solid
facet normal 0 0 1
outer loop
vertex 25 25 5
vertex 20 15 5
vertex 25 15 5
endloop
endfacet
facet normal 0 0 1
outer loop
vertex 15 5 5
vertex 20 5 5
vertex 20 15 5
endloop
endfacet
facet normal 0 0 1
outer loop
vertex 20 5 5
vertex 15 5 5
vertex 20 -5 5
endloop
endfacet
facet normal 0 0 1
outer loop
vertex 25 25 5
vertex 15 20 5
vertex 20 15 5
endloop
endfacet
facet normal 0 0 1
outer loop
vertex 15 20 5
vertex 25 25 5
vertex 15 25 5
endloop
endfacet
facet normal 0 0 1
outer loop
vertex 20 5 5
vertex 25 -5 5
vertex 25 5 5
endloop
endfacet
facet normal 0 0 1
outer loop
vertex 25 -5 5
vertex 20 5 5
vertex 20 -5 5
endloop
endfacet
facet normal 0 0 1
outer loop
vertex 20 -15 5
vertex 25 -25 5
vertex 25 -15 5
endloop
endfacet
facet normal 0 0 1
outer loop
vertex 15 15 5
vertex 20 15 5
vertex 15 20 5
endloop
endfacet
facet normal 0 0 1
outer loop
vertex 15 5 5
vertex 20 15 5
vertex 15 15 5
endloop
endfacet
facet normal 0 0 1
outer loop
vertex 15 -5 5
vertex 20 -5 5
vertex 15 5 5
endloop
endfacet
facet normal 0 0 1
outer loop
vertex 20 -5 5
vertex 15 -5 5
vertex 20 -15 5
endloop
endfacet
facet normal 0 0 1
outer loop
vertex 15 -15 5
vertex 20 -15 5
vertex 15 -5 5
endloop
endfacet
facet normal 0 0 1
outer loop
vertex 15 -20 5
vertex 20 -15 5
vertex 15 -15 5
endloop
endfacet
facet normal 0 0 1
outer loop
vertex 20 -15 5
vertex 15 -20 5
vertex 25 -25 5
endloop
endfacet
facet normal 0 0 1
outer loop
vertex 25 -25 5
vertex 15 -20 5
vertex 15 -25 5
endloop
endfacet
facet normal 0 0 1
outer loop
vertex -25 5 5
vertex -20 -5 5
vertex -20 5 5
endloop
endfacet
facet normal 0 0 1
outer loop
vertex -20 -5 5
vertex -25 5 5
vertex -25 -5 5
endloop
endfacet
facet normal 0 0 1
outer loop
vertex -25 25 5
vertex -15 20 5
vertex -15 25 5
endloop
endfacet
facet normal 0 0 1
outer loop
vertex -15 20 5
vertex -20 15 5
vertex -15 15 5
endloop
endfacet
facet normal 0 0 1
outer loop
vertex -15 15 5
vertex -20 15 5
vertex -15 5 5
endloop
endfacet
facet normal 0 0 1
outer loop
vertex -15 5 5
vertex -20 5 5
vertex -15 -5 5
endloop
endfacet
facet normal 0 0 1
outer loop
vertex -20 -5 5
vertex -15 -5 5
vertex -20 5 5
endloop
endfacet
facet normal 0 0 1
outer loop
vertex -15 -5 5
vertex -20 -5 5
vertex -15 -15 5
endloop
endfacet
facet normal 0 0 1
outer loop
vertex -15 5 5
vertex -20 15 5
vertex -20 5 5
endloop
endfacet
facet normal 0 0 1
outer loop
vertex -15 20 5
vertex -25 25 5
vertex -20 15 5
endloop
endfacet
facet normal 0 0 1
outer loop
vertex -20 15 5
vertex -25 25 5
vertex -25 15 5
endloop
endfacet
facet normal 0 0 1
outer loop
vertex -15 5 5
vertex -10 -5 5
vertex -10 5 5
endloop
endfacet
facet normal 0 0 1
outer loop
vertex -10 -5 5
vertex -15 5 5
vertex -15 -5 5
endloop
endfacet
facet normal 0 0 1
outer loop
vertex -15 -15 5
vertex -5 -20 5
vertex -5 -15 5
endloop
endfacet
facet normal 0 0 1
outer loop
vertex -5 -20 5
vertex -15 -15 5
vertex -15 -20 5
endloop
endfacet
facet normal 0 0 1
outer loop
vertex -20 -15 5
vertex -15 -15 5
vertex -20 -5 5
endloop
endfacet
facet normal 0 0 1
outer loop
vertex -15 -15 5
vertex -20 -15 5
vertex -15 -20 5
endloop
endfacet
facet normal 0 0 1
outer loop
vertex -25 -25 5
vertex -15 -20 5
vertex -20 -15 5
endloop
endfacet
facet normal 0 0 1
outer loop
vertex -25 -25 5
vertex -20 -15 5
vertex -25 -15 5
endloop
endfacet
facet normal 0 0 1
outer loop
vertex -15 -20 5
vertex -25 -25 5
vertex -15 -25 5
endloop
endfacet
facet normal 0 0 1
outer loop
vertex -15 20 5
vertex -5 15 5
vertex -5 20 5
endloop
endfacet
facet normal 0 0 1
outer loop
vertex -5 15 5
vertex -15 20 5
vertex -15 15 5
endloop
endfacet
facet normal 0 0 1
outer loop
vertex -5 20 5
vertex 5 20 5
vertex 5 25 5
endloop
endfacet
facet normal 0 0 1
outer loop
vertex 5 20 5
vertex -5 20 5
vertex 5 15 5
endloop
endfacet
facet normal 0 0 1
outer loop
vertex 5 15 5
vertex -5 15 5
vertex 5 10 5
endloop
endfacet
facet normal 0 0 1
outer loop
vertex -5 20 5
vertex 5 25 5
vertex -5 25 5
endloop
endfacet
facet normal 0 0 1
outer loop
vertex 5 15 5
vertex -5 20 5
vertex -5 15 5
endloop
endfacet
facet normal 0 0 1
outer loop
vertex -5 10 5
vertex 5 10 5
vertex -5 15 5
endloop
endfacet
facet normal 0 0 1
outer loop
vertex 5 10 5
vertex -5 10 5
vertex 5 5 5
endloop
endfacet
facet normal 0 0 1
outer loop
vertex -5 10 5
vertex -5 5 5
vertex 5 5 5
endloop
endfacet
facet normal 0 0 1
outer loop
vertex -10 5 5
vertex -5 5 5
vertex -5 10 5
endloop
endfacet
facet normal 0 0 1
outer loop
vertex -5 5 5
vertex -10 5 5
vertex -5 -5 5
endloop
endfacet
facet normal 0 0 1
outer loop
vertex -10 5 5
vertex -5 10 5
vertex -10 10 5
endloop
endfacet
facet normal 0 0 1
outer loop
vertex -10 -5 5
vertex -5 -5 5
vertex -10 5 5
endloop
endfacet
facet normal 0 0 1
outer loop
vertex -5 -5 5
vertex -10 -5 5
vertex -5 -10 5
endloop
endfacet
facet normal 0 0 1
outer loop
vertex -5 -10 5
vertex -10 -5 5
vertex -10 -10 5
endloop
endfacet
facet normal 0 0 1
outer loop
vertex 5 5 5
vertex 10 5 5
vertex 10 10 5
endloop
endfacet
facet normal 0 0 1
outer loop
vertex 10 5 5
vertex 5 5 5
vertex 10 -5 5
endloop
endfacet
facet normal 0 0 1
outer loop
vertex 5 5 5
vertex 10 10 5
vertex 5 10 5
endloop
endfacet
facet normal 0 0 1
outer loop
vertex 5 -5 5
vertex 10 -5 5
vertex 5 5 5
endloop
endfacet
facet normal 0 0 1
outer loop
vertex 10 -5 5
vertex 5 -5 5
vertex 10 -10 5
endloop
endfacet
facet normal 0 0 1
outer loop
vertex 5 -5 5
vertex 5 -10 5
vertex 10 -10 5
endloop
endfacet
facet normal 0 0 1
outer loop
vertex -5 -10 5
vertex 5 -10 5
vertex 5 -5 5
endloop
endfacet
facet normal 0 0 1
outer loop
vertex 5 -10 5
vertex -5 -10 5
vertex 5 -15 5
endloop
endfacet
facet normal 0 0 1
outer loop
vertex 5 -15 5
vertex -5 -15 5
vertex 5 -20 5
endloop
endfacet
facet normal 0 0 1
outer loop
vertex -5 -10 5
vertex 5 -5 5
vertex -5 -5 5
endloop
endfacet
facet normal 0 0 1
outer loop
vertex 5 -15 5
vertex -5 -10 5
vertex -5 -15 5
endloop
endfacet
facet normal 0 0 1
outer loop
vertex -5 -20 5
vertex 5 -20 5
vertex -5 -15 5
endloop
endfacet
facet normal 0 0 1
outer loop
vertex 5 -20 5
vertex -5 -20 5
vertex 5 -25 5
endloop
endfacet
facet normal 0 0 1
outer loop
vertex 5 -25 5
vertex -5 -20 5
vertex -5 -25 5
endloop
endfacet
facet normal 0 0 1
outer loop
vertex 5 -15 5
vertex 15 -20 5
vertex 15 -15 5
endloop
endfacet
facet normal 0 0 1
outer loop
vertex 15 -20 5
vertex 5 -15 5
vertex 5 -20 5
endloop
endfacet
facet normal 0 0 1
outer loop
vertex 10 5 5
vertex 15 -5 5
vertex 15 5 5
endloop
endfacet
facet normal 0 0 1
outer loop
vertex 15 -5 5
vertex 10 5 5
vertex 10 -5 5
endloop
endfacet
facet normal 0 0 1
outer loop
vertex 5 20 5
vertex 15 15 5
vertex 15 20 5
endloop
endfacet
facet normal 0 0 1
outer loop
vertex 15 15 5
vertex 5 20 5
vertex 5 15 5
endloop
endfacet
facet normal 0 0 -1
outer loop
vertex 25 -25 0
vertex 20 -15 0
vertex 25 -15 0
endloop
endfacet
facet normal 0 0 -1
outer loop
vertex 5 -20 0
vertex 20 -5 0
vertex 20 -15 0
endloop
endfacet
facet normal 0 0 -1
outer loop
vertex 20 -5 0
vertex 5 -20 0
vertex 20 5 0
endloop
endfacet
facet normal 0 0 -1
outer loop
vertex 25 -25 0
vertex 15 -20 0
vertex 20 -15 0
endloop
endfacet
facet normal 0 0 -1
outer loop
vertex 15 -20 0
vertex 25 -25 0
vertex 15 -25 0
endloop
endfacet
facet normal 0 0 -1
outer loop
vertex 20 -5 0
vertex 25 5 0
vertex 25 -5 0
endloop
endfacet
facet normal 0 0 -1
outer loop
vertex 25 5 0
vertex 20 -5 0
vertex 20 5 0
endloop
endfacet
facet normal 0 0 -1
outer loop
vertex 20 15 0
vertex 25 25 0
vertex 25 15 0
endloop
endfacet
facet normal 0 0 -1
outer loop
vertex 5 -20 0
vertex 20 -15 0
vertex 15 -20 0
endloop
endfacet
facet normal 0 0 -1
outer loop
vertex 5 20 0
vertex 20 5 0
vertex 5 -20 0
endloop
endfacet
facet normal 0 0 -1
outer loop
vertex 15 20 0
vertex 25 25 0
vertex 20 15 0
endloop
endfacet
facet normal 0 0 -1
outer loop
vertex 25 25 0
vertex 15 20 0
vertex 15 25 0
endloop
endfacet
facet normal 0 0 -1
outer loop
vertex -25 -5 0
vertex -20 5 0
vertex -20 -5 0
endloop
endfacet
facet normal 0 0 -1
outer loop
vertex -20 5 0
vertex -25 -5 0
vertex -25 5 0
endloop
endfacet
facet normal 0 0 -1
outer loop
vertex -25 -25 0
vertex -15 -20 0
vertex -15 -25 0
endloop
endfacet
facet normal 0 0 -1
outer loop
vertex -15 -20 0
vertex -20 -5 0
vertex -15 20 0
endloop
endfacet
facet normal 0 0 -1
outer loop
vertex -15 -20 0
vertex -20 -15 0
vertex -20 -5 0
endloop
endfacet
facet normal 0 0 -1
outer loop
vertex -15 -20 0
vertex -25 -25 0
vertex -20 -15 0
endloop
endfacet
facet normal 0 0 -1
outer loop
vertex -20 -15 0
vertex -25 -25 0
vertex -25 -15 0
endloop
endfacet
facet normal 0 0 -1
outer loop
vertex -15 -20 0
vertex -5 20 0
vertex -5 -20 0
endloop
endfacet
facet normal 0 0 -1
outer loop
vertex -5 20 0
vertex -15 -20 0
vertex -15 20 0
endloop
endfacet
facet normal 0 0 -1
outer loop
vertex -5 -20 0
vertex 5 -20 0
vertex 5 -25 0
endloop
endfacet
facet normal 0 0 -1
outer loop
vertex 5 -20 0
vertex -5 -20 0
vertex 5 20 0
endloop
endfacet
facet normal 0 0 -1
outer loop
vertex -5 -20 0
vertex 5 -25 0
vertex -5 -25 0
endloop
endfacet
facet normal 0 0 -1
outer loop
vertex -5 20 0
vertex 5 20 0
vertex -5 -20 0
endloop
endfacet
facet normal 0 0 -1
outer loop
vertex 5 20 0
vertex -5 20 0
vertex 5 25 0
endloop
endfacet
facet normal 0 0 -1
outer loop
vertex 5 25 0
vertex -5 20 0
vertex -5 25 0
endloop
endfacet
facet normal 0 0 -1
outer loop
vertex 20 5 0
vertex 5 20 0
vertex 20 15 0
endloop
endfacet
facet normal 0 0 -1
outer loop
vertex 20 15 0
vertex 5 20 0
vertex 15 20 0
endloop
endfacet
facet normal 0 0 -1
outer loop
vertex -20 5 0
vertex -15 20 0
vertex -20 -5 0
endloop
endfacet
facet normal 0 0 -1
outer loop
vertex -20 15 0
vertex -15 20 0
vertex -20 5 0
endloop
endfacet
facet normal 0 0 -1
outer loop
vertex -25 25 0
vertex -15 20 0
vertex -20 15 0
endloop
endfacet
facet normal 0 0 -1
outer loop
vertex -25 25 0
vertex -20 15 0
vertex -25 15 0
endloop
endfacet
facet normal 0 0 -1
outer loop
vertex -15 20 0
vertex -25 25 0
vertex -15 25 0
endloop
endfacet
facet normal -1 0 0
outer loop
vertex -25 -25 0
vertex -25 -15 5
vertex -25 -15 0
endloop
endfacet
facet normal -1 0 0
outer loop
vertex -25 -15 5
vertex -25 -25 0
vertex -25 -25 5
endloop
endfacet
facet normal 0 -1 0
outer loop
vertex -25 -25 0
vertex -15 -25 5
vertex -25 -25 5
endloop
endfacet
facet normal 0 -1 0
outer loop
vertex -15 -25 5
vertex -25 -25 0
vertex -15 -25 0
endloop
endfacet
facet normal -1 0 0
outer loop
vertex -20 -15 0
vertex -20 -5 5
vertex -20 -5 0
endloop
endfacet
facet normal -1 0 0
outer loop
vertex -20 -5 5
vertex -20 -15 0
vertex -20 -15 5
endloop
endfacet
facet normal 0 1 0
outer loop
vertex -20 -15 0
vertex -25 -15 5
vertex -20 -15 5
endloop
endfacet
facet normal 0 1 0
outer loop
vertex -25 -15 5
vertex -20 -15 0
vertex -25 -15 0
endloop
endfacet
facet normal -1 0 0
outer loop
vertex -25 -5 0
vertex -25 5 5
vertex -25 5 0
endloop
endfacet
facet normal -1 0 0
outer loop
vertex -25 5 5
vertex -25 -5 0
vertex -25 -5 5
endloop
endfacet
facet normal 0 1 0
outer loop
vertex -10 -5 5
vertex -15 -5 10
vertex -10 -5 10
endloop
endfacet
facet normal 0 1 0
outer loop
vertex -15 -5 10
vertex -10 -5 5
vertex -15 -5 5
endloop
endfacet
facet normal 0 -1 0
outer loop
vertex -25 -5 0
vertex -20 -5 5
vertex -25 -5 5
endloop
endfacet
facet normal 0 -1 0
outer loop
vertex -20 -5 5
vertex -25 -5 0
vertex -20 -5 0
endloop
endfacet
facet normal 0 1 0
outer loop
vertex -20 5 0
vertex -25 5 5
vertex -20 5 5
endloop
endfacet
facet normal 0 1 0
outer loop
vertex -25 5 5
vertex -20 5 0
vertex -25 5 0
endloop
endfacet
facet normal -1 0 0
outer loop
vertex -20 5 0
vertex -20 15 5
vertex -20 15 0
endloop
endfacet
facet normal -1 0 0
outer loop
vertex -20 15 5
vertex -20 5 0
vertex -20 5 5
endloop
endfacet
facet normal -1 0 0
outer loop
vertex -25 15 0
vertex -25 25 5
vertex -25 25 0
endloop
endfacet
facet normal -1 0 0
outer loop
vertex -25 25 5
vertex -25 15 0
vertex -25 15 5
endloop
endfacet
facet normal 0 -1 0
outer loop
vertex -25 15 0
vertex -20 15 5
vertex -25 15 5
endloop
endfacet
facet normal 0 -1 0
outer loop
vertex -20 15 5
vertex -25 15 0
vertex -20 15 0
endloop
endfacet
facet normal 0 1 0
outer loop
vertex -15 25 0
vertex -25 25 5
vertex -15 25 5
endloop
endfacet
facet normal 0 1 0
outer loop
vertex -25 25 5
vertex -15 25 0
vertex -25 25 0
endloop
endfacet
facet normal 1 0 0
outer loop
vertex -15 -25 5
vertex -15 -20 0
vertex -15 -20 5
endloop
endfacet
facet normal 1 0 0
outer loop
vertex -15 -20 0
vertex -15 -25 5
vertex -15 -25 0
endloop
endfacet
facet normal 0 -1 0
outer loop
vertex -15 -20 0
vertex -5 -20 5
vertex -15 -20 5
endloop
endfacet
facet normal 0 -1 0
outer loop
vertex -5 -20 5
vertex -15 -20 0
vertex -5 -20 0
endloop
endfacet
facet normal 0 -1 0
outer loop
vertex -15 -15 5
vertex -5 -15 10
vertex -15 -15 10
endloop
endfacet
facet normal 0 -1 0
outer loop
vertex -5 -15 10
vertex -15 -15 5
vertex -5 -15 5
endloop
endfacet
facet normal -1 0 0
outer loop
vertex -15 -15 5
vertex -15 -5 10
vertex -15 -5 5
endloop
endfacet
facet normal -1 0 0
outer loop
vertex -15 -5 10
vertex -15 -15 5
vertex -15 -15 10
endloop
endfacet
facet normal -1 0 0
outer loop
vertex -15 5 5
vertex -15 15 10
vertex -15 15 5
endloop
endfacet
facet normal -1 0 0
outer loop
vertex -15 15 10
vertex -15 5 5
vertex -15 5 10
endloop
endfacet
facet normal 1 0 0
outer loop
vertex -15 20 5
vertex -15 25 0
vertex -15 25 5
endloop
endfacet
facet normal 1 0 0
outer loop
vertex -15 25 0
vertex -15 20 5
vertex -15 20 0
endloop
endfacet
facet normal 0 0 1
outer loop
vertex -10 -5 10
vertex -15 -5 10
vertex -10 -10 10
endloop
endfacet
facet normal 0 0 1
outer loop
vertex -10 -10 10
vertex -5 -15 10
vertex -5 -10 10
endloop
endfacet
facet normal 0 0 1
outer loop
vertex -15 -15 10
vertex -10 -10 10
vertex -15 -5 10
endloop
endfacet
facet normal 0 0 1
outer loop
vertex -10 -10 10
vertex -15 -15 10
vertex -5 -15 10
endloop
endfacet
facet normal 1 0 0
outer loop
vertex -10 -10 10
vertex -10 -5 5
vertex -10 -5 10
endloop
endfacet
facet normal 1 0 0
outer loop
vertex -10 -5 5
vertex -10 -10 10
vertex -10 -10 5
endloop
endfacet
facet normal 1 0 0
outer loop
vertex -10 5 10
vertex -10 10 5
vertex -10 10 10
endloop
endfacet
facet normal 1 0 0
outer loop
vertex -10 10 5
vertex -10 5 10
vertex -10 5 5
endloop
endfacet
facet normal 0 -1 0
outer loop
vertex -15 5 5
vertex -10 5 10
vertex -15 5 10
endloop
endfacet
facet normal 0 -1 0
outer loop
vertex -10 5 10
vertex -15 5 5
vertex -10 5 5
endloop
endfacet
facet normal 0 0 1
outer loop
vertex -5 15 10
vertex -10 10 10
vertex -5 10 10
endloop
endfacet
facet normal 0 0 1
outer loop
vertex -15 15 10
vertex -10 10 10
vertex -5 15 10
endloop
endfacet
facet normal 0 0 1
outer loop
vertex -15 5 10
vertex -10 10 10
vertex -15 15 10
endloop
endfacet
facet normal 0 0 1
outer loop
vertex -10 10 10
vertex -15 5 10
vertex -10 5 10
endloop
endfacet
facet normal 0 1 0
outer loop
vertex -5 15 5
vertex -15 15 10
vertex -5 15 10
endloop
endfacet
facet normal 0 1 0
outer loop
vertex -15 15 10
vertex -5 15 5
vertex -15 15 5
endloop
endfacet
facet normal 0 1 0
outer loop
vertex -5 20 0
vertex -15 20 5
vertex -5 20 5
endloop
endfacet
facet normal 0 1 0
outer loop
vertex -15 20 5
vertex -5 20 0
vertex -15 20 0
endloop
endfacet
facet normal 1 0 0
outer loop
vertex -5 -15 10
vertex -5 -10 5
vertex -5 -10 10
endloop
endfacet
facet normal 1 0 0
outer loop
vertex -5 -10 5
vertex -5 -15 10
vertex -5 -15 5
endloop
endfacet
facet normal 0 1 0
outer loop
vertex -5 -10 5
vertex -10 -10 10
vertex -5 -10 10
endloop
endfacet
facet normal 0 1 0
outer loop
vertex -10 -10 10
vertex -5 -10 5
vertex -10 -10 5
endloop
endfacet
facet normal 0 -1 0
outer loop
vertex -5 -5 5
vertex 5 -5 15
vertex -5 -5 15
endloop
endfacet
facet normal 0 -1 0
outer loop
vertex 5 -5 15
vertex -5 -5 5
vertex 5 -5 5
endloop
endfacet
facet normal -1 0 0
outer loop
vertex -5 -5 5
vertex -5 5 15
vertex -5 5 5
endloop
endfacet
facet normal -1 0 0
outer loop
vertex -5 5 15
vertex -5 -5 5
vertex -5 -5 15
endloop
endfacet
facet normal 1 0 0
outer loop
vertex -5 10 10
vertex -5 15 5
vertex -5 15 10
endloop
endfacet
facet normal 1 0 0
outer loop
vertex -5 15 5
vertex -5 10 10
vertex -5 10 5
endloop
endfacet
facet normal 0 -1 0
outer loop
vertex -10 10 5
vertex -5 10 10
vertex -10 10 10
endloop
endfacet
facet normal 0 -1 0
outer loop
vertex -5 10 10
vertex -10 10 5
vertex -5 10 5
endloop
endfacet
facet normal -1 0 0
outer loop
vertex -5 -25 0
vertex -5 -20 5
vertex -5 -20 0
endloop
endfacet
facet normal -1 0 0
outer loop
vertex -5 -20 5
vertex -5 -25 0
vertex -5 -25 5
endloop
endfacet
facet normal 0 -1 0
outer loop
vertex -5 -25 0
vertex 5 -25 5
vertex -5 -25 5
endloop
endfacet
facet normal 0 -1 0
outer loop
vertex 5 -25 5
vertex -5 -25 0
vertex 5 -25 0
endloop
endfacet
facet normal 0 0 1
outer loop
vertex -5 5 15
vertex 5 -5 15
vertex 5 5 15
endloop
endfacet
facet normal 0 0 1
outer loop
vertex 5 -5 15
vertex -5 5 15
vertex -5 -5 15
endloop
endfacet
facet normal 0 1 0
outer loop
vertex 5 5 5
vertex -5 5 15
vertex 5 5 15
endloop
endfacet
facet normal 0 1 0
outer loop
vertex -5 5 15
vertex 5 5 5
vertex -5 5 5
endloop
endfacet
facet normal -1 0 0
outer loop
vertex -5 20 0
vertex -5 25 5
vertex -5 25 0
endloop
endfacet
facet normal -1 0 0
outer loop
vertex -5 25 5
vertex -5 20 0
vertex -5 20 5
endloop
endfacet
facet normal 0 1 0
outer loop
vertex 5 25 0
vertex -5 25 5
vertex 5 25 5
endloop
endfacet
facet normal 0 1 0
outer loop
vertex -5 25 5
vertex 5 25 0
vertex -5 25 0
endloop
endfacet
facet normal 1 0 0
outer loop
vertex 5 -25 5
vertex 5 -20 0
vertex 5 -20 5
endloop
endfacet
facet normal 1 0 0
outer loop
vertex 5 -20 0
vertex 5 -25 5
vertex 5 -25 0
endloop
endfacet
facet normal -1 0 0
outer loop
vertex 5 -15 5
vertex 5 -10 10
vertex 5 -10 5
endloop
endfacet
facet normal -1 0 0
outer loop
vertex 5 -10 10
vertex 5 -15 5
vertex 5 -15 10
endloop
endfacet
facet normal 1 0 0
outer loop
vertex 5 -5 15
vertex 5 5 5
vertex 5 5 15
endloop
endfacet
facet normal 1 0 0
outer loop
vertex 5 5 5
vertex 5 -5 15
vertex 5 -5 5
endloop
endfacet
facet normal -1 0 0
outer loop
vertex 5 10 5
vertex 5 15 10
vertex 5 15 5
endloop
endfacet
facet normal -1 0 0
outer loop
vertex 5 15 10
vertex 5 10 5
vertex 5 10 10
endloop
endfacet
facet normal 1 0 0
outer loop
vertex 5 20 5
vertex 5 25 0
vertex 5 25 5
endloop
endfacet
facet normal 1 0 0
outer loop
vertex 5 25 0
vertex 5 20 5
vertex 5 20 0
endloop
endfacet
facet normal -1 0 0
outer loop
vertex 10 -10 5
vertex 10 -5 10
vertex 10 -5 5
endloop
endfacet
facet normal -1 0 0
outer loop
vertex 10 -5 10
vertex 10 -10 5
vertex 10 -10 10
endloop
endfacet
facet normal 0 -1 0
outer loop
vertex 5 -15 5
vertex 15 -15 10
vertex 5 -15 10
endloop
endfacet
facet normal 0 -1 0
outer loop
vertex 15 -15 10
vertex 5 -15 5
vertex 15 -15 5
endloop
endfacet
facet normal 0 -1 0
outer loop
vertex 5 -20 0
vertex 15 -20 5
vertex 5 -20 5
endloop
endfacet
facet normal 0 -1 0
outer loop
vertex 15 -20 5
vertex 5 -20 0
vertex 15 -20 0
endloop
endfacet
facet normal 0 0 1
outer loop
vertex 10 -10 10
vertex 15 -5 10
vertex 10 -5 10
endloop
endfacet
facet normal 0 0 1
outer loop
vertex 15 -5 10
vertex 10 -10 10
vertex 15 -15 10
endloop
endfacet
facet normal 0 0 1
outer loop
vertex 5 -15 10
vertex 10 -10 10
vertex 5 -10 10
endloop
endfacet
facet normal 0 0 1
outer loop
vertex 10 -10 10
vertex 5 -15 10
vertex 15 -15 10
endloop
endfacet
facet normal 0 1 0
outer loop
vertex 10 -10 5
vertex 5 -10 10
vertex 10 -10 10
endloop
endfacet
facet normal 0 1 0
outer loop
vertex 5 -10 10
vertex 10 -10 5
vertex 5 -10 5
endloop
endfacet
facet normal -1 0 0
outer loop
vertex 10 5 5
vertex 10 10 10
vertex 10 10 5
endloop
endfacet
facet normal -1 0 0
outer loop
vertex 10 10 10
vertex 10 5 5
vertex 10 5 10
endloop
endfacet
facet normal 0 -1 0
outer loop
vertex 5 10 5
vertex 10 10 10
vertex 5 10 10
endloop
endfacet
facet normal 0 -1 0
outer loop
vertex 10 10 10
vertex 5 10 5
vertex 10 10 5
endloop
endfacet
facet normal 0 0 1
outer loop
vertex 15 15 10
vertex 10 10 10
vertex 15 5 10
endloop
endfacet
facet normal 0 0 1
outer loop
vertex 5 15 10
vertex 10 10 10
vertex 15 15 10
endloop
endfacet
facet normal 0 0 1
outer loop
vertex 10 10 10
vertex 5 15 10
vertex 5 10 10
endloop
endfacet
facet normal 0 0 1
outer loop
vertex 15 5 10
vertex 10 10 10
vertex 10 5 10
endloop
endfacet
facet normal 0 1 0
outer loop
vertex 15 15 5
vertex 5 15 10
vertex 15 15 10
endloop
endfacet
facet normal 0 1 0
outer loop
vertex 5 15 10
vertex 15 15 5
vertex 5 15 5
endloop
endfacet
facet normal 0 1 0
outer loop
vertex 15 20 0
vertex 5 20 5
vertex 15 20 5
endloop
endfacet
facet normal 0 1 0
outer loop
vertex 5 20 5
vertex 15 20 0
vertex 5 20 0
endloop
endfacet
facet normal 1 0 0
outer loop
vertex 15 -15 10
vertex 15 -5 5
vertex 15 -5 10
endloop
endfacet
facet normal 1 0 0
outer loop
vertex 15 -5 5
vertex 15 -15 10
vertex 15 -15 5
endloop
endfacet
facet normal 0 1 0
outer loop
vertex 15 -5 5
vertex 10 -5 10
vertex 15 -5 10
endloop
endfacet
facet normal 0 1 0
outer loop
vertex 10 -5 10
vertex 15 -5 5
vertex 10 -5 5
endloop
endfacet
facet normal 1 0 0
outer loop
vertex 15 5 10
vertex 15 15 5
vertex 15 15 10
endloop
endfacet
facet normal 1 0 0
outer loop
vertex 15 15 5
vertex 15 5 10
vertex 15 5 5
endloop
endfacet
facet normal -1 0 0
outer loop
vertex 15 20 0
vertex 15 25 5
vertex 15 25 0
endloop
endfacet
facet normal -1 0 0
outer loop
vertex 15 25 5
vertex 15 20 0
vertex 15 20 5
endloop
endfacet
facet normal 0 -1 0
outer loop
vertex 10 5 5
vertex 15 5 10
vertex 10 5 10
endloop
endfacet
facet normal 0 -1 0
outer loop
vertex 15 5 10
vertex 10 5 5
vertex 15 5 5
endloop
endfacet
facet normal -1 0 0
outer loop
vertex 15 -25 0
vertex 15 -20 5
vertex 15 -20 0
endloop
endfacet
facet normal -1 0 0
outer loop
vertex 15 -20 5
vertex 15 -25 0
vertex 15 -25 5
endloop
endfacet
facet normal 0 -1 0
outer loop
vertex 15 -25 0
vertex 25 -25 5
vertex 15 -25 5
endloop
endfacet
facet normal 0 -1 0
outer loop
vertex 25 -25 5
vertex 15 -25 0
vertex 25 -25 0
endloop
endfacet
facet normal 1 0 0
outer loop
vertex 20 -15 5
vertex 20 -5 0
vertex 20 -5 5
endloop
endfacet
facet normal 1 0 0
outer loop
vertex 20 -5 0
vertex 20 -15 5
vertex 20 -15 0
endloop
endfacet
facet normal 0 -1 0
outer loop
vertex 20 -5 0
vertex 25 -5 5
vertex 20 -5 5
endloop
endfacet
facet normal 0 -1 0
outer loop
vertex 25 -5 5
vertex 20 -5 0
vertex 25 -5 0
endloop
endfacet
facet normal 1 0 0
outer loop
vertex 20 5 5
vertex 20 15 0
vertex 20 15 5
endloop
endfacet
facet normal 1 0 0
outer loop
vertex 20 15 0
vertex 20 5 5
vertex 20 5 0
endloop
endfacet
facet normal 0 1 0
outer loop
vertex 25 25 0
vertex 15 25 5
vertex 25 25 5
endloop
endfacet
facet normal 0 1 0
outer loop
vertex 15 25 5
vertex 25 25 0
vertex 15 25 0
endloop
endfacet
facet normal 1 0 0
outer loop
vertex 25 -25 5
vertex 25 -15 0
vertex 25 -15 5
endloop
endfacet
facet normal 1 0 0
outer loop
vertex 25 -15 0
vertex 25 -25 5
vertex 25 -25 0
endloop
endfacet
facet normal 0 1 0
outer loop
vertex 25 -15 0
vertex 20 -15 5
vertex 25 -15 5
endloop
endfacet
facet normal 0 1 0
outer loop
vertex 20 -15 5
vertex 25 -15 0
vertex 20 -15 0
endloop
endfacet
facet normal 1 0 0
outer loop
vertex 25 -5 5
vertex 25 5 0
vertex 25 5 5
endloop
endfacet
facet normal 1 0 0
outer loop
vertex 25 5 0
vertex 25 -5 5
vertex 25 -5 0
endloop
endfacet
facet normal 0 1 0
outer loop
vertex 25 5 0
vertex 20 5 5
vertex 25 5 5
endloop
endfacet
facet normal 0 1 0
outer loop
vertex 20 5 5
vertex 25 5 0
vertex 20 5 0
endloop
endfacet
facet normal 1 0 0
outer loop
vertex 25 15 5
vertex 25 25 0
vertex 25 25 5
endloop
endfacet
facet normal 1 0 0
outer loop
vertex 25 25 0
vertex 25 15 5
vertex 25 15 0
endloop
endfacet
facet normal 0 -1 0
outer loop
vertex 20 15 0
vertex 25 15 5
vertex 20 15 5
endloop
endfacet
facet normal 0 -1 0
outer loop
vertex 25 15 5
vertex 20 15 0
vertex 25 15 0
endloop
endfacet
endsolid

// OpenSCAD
use <bitmap.scad>
/*
Height Map Example
Tony Buser <tbuser@gmail.com>
http://tonybuser.com
http://creativecommons.org/licenses/by/3.0/

Can also dynamically run this by passing an array on the command line:

/Applications/OpenSCAD.app/Contents/MacOS/OpenSCAD -m make -D
bitmap=[2,2,2,0,1,3,2,2,2] -D row_size=3 -s height_map.stl height_map.scad
*/

block_size = 5;
height = 5;

row_size = 10; // 10x10 pixels
bitmap = [
    1, 1, 0, 0, 1, 1, 0, 0, 1, 1, 1, 1, 1, 1, 1, 1, 1, 1, 1, 1, 0, 1, 2, 2, 1,
    1, 2, 2, 1, 0, 0, 1, 2, 1, 1, 1, 1, 2, 1, 0, 1, 1, 1, 1, 3, 3, 1, 1, 1, 1,
    1, 1, 1, 1, 3, 3, 1, 1, 1, 1, 0, 1, 2, 1, 1, 1, 1, 2, 1, 0, 0, 1, 2, 2, 1,
    1, 2, 2, 1, 0, 1, 1, 1, 1, 1, 1, 1, 1, 1, 1, 1, 1, 0, 0, 1, 1, 0, 0, 1, 1
];

bitmap(bitmap, block_size, height, row_size);
